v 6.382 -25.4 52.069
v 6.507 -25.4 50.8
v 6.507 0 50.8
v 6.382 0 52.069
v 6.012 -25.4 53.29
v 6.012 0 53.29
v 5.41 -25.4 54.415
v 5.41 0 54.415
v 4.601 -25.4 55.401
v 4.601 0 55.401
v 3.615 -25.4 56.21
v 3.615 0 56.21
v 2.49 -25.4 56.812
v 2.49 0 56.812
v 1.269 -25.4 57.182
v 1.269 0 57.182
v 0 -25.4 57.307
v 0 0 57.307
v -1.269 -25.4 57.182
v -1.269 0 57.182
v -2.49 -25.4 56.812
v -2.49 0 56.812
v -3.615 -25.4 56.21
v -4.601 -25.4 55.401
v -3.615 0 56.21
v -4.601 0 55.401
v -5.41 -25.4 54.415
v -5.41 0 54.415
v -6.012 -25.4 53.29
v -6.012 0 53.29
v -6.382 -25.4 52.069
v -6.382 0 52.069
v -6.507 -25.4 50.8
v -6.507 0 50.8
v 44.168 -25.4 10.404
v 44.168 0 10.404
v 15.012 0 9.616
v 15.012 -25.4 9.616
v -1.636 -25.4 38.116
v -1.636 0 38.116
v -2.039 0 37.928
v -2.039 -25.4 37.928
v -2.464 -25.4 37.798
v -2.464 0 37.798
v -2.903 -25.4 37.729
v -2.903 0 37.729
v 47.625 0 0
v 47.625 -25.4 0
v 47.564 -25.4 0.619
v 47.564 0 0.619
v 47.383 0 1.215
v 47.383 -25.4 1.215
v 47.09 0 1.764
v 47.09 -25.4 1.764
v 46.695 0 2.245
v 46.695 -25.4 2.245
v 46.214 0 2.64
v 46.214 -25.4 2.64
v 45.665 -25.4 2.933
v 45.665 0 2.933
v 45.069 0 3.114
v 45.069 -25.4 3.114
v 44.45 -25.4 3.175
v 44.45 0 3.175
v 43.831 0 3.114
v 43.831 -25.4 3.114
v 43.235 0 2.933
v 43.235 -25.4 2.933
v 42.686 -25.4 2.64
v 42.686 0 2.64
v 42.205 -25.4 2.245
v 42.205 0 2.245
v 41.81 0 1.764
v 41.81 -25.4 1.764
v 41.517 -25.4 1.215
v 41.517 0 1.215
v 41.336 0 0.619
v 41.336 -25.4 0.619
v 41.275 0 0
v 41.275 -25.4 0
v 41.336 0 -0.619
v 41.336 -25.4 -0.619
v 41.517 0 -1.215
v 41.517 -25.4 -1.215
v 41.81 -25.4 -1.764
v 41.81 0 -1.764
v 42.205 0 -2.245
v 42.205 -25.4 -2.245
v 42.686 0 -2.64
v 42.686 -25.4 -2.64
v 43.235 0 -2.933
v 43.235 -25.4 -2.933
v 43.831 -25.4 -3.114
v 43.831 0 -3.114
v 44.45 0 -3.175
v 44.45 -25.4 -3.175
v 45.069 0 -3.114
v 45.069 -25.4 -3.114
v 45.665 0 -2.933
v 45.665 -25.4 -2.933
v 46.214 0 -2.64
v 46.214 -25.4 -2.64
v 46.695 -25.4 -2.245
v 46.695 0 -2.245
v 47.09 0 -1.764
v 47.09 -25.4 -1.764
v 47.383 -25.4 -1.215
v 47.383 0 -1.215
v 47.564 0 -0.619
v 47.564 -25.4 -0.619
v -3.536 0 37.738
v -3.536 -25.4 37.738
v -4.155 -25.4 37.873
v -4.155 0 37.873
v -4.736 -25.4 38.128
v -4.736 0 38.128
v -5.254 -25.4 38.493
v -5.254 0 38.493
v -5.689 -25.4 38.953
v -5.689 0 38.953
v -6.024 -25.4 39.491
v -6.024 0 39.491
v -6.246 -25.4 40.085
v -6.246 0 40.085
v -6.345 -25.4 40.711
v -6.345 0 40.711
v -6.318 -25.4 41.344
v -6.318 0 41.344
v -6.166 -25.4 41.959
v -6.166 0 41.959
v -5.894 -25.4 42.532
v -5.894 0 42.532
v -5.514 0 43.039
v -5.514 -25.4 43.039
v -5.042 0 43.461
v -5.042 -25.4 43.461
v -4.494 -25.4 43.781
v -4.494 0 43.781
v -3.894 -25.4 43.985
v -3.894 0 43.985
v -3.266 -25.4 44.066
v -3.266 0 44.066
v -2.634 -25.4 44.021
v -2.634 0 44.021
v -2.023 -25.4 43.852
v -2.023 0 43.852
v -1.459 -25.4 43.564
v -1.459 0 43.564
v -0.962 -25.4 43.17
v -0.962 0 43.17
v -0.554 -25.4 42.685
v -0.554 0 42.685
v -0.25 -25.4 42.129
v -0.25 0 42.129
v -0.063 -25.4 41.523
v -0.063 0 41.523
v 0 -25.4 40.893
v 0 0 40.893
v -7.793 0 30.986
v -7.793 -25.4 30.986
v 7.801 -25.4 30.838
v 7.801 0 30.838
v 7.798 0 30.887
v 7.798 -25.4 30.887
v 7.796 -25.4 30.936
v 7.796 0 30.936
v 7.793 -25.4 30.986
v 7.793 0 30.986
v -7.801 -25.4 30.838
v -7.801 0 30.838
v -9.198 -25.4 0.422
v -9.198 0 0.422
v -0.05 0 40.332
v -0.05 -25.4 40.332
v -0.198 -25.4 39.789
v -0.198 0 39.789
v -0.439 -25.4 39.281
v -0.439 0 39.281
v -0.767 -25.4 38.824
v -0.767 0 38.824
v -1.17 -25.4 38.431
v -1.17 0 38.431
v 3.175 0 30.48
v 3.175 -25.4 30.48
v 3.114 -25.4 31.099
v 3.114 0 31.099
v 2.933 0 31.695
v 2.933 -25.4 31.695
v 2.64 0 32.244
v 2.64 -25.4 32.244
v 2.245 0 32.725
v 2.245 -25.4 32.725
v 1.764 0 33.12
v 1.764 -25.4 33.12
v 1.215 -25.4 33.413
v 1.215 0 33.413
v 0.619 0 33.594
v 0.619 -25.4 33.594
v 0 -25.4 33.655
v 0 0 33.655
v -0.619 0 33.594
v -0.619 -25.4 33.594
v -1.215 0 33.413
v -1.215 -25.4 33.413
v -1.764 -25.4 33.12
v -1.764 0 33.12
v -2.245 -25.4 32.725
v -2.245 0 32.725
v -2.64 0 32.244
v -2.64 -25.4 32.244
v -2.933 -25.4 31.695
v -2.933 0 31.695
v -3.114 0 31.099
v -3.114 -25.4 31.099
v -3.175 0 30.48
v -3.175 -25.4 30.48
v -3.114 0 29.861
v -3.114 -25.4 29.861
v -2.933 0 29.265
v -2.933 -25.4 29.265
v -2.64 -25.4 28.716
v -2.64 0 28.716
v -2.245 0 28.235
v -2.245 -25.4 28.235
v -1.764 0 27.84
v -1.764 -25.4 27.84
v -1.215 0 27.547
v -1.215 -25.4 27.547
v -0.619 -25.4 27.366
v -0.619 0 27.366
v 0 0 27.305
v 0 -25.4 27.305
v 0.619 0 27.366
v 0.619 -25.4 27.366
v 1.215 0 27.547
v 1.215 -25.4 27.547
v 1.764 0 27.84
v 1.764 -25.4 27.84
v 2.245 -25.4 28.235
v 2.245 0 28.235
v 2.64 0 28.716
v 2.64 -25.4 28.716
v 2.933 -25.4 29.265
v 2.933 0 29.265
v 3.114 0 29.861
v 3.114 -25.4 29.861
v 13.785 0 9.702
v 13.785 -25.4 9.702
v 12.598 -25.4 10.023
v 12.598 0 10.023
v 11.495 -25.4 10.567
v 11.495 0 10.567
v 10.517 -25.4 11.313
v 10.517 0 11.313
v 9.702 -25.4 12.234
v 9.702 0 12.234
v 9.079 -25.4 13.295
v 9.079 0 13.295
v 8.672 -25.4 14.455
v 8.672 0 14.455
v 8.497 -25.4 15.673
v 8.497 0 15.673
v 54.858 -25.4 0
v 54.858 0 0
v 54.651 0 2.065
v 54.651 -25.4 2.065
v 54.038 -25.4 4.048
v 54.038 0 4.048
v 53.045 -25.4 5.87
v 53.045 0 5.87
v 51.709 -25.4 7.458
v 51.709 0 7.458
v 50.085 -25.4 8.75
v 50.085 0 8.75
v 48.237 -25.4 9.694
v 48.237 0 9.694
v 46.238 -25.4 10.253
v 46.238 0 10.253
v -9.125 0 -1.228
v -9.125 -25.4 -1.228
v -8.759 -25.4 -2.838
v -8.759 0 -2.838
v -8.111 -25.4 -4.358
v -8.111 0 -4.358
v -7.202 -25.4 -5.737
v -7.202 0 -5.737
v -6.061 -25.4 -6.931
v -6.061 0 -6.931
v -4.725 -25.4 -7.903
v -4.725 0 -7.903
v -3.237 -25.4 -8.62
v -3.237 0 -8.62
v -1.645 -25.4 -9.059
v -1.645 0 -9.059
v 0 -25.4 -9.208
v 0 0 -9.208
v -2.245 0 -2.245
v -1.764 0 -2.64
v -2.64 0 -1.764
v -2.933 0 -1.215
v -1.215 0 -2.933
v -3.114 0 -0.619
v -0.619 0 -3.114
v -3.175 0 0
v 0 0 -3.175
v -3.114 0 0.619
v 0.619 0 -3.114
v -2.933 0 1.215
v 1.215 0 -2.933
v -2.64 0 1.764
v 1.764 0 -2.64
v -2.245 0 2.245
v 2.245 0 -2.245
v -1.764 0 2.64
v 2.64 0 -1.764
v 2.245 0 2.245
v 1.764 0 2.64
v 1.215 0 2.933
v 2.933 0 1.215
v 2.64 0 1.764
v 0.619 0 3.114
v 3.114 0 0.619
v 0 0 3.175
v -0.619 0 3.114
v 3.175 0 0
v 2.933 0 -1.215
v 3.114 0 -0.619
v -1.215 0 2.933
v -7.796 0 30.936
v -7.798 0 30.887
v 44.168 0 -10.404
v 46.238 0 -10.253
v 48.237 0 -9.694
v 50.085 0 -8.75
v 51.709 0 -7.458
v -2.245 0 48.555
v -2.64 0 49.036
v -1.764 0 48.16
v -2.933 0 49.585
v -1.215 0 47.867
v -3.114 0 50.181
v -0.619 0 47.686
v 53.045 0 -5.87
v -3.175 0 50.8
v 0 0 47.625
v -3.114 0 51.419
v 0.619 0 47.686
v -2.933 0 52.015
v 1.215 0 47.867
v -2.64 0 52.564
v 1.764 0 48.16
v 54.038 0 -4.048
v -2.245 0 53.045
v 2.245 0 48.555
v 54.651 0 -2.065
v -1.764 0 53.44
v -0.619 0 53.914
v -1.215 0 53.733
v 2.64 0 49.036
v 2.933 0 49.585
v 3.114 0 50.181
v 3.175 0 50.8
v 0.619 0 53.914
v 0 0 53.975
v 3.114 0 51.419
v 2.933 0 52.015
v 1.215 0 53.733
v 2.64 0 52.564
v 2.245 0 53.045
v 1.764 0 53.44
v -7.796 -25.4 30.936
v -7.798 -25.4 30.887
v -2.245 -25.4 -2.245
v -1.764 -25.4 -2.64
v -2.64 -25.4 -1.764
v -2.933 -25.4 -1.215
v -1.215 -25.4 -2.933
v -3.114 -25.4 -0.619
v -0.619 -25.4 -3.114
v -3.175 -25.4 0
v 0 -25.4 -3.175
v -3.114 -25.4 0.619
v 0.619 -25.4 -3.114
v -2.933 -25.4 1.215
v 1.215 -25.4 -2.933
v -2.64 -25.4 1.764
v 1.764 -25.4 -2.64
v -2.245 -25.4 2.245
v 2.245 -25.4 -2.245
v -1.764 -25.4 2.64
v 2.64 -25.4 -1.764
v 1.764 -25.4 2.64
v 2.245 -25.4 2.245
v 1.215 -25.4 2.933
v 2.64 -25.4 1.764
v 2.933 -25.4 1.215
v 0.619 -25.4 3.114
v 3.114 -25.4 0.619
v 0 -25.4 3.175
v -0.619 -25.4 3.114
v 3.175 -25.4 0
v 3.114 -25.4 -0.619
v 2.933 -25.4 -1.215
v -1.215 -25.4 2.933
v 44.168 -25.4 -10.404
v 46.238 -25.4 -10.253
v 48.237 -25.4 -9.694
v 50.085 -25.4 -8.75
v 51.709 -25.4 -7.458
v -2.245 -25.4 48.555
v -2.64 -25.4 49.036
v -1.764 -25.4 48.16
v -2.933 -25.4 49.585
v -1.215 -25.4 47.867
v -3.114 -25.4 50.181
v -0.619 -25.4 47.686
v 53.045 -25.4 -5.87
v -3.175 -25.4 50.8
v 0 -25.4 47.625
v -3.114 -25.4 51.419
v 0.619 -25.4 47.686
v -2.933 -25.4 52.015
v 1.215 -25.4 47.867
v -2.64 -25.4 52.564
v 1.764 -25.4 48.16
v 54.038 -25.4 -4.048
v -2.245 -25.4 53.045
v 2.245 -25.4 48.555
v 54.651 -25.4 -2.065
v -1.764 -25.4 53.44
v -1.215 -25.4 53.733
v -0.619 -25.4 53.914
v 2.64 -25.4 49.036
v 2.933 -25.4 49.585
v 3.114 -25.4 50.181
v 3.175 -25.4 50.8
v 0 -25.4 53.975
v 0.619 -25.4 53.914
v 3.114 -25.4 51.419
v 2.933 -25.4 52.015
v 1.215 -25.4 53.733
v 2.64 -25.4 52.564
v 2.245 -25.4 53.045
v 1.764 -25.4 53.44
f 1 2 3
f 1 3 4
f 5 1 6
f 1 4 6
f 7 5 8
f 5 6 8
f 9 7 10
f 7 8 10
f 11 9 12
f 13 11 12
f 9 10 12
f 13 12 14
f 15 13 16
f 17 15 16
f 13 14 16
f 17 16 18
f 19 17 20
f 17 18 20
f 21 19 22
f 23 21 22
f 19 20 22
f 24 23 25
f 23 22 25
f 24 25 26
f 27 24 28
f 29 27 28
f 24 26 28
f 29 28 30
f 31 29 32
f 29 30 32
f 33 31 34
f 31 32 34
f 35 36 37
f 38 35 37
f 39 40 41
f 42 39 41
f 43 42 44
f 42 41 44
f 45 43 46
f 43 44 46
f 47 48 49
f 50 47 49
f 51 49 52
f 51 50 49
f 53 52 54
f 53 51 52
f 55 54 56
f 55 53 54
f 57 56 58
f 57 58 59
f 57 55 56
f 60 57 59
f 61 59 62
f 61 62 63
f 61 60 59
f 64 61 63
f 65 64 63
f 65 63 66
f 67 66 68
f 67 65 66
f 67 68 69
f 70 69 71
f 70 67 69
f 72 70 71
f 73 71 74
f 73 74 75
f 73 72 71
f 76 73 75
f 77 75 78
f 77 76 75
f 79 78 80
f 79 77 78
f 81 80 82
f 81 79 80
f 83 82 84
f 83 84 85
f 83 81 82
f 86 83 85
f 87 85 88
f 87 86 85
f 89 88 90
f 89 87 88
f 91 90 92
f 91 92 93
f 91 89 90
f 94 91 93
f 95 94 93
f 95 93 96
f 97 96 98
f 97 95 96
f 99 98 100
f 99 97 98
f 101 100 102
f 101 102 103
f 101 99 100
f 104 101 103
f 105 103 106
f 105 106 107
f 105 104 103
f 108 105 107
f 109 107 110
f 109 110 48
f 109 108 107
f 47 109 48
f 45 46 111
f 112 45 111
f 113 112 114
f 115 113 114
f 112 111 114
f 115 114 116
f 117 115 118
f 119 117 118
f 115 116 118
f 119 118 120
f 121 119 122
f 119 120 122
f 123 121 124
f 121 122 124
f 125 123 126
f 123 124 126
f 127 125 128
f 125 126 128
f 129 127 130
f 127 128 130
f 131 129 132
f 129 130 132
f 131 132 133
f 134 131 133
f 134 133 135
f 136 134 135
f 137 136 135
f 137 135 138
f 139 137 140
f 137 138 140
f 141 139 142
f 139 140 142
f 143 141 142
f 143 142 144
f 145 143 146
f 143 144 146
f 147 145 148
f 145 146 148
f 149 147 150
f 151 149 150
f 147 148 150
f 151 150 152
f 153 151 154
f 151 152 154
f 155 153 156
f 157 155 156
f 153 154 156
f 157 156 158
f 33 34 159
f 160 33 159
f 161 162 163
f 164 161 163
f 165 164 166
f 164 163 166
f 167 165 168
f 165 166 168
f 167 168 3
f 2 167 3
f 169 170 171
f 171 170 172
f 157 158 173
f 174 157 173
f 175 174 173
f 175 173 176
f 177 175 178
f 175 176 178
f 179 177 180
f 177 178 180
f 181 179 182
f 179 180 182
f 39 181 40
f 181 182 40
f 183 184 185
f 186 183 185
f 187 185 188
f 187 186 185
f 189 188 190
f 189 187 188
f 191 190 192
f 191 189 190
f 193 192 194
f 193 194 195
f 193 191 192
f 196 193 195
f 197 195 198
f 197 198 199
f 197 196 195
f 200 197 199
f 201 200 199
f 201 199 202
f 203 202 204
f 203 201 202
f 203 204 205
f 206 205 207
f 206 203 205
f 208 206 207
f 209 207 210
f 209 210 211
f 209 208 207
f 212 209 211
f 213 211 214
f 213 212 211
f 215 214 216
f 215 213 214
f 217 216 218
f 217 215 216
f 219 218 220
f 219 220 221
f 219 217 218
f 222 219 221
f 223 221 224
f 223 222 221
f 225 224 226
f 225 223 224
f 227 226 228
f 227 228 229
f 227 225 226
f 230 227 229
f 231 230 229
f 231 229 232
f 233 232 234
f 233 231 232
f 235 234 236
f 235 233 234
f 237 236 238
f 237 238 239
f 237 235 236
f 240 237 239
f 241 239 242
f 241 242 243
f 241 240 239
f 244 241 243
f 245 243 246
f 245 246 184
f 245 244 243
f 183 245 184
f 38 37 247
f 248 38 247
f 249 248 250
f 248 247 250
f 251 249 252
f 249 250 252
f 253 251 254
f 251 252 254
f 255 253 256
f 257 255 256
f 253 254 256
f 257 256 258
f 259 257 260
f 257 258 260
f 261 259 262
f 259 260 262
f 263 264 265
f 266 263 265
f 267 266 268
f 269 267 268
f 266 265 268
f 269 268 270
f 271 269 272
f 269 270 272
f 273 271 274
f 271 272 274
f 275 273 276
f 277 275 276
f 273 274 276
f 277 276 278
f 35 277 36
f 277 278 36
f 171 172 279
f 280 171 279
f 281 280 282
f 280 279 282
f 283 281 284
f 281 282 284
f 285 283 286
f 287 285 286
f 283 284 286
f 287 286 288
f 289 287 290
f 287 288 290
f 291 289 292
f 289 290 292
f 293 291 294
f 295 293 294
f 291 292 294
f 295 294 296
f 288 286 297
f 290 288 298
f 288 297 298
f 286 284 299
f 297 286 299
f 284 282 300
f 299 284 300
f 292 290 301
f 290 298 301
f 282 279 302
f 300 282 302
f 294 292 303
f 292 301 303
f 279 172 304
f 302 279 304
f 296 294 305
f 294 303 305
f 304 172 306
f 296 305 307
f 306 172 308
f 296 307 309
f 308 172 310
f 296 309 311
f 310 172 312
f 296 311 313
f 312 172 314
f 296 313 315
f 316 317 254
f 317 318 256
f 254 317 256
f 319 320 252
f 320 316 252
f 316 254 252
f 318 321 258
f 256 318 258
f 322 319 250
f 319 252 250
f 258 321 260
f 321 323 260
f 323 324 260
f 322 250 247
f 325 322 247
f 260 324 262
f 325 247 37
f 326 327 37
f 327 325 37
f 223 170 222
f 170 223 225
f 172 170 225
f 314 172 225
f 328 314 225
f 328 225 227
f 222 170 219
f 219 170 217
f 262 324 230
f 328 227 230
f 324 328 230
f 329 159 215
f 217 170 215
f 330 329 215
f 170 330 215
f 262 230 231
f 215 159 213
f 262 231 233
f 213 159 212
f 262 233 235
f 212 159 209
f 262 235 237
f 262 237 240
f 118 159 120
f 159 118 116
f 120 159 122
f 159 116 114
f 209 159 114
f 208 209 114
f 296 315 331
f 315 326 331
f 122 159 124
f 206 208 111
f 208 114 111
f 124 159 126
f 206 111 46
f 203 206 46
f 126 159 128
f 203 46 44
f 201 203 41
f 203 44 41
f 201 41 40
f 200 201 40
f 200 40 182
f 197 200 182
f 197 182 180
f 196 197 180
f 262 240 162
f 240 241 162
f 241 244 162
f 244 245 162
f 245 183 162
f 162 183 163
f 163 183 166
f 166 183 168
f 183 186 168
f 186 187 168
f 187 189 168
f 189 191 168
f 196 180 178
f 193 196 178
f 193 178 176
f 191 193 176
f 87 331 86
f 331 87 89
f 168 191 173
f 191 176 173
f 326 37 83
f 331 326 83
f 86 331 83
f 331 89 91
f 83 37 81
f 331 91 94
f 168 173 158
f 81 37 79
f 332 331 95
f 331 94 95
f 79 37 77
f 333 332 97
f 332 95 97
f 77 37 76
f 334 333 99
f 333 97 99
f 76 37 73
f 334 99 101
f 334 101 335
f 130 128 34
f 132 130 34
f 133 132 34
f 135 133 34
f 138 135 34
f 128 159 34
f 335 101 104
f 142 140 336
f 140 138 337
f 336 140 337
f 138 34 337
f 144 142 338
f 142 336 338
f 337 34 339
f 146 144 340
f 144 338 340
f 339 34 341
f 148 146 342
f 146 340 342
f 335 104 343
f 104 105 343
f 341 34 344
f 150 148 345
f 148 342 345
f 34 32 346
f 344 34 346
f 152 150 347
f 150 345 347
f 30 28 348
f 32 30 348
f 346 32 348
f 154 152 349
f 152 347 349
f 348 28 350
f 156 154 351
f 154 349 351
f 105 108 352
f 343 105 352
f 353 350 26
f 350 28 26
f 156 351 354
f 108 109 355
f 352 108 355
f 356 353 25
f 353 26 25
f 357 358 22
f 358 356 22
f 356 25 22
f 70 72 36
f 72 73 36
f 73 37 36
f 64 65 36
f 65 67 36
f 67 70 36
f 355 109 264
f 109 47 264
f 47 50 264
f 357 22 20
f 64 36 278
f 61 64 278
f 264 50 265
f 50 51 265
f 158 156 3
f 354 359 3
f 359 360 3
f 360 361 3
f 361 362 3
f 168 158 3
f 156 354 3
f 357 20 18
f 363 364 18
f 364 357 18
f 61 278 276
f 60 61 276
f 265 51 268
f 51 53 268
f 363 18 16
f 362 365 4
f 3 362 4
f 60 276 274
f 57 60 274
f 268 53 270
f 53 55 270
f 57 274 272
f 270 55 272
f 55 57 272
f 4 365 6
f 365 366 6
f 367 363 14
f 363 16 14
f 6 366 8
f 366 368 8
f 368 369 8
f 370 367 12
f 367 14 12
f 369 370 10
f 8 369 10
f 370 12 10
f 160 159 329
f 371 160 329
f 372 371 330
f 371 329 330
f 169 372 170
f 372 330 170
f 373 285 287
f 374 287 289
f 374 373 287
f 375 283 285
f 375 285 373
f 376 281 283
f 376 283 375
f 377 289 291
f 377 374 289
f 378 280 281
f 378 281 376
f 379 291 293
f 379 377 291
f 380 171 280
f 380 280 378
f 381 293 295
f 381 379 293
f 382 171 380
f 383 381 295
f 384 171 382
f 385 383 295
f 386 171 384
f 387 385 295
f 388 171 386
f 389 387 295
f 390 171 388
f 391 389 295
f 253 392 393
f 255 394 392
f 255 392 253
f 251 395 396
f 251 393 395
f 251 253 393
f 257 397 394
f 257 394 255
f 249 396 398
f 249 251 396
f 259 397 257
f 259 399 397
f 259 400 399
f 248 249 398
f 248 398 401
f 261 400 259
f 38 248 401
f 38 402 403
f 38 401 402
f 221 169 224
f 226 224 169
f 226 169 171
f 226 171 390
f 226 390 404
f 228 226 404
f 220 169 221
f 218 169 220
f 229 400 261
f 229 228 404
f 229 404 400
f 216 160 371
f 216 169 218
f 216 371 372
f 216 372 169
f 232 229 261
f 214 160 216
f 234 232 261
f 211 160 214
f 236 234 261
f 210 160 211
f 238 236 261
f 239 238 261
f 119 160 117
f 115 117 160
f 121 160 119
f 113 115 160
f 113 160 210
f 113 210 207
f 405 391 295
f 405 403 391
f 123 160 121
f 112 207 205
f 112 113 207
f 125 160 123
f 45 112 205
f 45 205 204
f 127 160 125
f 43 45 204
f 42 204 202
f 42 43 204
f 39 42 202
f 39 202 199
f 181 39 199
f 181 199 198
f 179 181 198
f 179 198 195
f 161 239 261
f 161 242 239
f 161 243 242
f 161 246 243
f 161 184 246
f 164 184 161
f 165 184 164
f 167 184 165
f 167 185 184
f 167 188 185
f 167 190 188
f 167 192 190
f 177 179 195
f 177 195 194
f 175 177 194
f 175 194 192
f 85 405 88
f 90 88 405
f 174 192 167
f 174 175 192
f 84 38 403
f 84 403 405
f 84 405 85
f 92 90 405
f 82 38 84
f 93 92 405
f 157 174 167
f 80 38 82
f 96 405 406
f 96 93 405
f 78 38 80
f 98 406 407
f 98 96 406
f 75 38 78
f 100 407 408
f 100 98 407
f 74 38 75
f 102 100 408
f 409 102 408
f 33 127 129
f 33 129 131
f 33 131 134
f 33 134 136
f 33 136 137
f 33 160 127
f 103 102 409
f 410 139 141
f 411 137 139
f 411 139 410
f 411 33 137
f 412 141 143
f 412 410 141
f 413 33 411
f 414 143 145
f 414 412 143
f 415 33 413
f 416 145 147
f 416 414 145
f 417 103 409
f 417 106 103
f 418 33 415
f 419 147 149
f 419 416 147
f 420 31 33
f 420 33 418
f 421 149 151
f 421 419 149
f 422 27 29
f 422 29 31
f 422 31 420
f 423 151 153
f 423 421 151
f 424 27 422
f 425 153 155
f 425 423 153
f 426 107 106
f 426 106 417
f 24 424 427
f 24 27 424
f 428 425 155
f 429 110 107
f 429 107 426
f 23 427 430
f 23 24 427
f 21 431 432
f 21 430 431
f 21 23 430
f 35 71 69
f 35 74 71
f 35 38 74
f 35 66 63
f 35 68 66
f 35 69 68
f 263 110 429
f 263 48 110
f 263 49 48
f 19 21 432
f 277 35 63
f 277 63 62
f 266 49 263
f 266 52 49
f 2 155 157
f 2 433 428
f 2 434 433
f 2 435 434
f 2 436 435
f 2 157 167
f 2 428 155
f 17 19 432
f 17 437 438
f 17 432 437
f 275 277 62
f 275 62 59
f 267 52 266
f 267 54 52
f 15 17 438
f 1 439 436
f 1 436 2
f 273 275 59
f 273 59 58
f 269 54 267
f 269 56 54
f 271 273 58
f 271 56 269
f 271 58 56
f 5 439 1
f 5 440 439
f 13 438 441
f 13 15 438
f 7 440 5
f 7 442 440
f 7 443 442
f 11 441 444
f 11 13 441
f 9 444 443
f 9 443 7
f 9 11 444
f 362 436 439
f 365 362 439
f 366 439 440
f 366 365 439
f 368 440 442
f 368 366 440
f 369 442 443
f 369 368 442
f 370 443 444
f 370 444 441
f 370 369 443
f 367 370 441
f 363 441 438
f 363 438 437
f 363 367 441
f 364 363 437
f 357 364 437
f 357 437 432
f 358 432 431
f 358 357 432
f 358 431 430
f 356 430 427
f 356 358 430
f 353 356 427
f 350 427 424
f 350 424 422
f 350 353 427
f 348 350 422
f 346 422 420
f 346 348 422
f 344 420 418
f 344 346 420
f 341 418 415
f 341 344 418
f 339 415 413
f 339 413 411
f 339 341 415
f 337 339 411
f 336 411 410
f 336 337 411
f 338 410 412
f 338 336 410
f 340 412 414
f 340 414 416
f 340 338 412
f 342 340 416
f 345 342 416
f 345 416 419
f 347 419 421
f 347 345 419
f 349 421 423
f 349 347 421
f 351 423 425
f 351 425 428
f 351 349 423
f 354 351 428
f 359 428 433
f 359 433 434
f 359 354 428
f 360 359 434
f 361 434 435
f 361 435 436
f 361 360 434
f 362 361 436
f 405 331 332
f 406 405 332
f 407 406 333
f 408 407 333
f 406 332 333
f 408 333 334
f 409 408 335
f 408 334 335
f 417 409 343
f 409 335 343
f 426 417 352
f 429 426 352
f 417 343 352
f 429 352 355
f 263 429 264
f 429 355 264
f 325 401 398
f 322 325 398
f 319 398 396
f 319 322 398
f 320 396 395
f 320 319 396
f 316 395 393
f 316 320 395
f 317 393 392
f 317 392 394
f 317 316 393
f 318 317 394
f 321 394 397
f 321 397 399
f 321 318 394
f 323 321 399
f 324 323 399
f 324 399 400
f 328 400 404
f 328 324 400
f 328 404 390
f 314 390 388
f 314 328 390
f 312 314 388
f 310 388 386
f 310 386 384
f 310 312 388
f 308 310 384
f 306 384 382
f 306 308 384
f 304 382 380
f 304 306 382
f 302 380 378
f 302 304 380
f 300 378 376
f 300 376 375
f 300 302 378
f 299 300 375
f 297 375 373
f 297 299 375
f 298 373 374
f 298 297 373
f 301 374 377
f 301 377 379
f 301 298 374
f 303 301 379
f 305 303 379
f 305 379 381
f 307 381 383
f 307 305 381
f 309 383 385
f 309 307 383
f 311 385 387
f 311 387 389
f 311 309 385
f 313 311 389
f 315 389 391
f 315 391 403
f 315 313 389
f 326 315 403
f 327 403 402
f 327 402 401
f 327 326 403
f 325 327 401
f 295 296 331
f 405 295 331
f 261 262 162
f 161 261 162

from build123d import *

# Parameters (mm, degrees)
F0_R     = 3.175
F1_DEPTH = 25.4


with BuildPart() as f1:
    # F0 (on Front) → F1 (new body)
    with BuildSketch(Plane.XZ):
        with BuildLine():
            ThreePointArc((-6.507071, 50.8), (0, 44.292929), (6.507071, 50.8))
            ThreePointArc((6.507071, 50.8), (0, 57.307071), (-6.507071, 50.8))
        make_face()
        with Locations((0, 50.8)):
            Circle(F0_R, mode=Mode.SUBTRACT)
        with BuildLine():
            ThreePointArc((9.2075, 0), (0.211295, 9.205075), (-9.197802, 0.422479))
            ThreePointArc((-9.197802, 0.422479), (-6.658379, -6.359563), (0, -9.2075))
            ThreePointArc((0, -9.2075), (6.510686, -6.510686), (9.2075, 0))
        make_face()
        Circle(F0_R, mode=Mode.SUBTRACT)
        with BuildLine():
            ThreePointArc((54.857703, 0), (51.709039, 7.458327), (44.168189, 10.403887))
            ThreePointArc((44.168189, 10.403887), (34.042297, 0), (44.168189, -10.403887))
            ThreePointArc((44.168189, -10.403887), (51.709039, -7.458327), (54.857703, 0))
        make_face()
        with Locations((44.45, 0)):
            Circle(F0_R, mode=Mode.SUBTRACT)
        with BuildLine():
            Line((7.792568, 30.985557), (6.507071, 50.8))
            ThreePointArc((6.507071, 50.8), (0, 44.292929), (-6.507071, 50.8))
            Line((-6.507071, 50.8), (-7.792568, 30.985557))
            ThreePointArc((-7.792568, 30.985557), (-6.321894, 35.064034), (-2.902509, 37.729493))
            ThreePointArc((-2.902509, 37.729493), (-5.514421, 43.039341), (0, 40.892778))
            ThreePointArc((0, 40.892778), (-0.439454, 39.281128), (-1.636167, 38.115618))
            ThreePointArc((-1.636167, 38.115618), (4.71007, 36.708559), (7.792568, 30.985557))
        make_face()
        with BuildLine():
            ThreePointArc((7.800726, 30.838307), (7.796995, 30.911951), (7.792568, 30.985557))
            ThreePointArc((7.792568, 30.985557), (4.71007, 36.708559), (-1.636167, 38.115618))
            ThreePointArc((-1.636167, 38.115618), (-2.248989, 37.855818), (-2.902509, 37.729493))
            ThreePointArc((-2.902509, 37.729493), (-6.321894, 35.064034), (-7.792568, 30.985557))
            ThreePointArc((-7.792568, 30.985557), (-7.796995, 30.911951), (-7.800726, 30.838307))
            ThreePointArc((-7.800726, 30.838307), (-0.179201, 22.673106), (7.80895, 30.48))
            ThreePointArc((7.80895, 30.48), (7.806894, 30.659201), (7.800726, 30.838307))
        make_face()
        with Locations((0, 30.48)):
            Circle(F0_R, mode=Mode.SUBTRACT)
        with BuildLine():
            Line((8.497322, 15.672671), (7.800726, 30.838307))
            ThreePointArc((7.800726, 30.838307), (7.806894, 30.659201), (7.80895, 30.48))
            ThreePointArc((7.80895, 30.48), (-0.179201, 22.673106), (-7.800726, 30.838307))
            Line((-7.800726, 30.838307), (-9.197802, 0.422479))
            ThreePointArc((-9.197802, 0.422479), (0.211295, 9.205075), (9.2075, 0))
            ThreePointArc((9.2075, 0), (6.510686, -6.510686), (0, -9.2075))
            Line((0, -9.2075), (44.168189, -10.403887))
            ThreePointArc((44.168189, -10.403887), (34.042297, 0), (44.168189, 10.403887))
            Line((44.168189, 10.403887), (15.012092, 9.616351))
            ThreePointArc((15.012092, 9.616351), (10.517129, 11.313251), (8.497322, 15.672671))
        make_face()
    extrude(amount=F1_DEPTH)


solid = f1.part
